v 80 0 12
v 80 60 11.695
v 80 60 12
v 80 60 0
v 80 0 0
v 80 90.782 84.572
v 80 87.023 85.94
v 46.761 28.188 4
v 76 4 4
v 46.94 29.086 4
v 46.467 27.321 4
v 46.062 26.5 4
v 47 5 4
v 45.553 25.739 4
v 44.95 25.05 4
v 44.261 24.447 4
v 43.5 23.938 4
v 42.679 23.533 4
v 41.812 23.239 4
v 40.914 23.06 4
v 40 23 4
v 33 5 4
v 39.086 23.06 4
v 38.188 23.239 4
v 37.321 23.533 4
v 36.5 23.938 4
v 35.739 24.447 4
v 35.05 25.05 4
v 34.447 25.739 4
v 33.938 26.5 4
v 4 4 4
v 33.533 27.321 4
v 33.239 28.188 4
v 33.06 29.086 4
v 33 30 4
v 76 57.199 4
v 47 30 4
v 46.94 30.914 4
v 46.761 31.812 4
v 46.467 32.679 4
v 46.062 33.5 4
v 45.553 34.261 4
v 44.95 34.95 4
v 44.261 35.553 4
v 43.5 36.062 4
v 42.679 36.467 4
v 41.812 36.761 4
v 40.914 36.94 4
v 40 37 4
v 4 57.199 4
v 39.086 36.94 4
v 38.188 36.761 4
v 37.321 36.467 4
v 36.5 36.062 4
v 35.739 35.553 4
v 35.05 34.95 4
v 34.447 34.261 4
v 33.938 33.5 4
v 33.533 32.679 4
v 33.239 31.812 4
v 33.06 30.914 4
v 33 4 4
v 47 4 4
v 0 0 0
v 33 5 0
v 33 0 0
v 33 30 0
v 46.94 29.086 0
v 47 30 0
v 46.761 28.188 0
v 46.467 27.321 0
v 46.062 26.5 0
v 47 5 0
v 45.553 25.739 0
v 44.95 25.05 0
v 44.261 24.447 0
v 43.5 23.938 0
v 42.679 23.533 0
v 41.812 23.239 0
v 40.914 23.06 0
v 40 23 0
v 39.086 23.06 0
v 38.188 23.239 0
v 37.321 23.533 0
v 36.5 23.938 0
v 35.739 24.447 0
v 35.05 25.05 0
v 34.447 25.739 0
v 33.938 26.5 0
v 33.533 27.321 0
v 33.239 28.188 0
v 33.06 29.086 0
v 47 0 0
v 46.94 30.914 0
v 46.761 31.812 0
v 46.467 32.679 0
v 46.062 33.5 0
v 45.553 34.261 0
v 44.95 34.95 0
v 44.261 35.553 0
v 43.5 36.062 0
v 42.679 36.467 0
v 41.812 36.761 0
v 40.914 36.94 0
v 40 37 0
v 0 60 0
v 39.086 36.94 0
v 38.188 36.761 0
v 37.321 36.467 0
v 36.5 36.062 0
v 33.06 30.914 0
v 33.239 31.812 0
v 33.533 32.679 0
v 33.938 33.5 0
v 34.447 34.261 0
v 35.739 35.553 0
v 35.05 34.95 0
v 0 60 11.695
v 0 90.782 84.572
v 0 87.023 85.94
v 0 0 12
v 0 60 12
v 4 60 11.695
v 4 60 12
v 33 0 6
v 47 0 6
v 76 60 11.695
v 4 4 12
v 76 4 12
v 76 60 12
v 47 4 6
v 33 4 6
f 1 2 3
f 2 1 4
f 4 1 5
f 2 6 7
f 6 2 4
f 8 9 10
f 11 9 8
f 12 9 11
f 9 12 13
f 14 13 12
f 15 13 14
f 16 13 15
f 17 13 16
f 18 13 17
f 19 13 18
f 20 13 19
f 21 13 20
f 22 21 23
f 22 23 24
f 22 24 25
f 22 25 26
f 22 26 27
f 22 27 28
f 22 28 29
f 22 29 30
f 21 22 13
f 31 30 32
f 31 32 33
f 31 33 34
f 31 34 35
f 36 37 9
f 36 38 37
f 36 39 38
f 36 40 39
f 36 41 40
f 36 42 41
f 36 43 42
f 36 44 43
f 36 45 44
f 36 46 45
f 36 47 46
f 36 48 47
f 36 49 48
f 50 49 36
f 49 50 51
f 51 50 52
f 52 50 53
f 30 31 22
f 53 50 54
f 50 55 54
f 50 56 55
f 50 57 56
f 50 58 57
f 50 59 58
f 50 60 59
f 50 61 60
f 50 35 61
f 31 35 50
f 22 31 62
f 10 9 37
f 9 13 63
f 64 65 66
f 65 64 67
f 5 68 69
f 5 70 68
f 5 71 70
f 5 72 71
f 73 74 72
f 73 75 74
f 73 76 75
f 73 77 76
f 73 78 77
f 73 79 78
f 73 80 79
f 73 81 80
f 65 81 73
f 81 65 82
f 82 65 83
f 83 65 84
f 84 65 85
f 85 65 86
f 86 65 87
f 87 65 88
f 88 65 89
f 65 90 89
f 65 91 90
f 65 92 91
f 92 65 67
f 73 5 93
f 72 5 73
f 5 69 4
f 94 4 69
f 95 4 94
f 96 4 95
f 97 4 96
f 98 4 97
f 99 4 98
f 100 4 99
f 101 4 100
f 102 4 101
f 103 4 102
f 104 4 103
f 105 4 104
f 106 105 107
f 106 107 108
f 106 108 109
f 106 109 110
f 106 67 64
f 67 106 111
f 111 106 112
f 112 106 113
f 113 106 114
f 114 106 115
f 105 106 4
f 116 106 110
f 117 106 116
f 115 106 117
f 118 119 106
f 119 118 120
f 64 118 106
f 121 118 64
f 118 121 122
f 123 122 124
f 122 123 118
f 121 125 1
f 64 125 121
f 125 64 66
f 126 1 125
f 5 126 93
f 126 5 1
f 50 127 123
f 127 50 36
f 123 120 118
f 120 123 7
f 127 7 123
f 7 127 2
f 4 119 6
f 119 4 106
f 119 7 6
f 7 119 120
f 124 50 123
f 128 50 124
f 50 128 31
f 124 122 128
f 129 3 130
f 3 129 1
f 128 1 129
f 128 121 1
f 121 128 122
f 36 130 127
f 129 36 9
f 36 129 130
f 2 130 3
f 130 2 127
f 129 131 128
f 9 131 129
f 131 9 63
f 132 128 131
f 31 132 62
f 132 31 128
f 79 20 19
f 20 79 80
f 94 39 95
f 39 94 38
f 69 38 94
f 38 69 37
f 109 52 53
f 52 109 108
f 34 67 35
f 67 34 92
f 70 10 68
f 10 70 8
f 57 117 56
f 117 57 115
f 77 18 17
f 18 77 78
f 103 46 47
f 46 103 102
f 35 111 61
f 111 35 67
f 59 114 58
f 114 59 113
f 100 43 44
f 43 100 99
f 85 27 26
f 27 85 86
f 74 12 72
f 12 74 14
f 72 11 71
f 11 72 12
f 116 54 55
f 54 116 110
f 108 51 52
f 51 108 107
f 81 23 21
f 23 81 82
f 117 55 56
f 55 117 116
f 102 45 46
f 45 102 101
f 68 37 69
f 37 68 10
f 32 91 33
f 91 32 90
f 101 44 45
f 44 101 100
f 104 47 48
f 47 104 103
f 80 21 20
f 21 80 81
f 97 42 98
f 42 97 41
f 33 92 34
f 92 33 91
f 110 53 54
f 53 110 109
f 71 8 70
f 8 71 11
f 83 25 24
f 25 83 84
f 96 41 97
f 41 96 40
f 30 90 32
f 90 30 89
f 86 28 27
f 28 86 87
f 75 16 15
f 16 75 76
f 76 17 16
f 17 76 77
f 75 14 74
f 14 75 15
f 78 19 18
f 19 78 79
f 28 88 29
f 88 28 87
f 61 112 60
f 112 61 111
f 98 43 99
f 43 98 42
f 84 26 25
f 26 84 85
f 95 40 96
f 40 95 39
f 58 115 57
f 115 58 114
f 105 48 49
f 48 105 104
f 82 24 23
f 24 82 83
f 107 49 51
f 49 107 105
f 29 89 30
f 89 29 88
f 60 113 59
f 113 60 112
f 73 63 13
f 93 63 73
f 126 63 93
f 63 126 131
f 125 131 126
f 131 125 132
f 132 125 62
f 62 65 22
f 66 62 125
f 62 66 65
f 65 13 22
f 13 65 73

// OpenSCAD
// Parametric Phone Stand
// Adjustable viewing angle with cable routing

phone_w = 80;
wall = 4;
base_depth = 60;
stand_height = 90;
angle = 70;
lip_height = 12;
cable_hole = 14;

module phone_stand() {
    difference() {
        union() {
            // Base plate
            cube([phone_w, base_depth, wall]);

            // Angled back support
            translate([0, base_depth, 0])
                rotate([angle, 0, 0])
                cube([phone_w, stand_height, wall]);

            // Left side wall
            translate([0, 0, 0])
                cube([wall, base_depth, lip_height]);

            // Right side wall
            translate([phone_w - wall, 0, 0])
                cube([wall, base_depth, lip_height]);

            // Front lip to hold phone
            cube([phone_w, wall, lip_height]);
        }

        // Cable routing hole in base
        translate([phone_w/2, base_depth/2, -1])
            cylinder(h = wall + 2, d = cable_hole, $fn = 48);

        // Cutout in front lip for cable
        translate([phone_w/2 - cable_hole/2, -1, 0])
            cube([cable_hole, wall + 2, lip_height/2]);
    }
}

phone_stand();
